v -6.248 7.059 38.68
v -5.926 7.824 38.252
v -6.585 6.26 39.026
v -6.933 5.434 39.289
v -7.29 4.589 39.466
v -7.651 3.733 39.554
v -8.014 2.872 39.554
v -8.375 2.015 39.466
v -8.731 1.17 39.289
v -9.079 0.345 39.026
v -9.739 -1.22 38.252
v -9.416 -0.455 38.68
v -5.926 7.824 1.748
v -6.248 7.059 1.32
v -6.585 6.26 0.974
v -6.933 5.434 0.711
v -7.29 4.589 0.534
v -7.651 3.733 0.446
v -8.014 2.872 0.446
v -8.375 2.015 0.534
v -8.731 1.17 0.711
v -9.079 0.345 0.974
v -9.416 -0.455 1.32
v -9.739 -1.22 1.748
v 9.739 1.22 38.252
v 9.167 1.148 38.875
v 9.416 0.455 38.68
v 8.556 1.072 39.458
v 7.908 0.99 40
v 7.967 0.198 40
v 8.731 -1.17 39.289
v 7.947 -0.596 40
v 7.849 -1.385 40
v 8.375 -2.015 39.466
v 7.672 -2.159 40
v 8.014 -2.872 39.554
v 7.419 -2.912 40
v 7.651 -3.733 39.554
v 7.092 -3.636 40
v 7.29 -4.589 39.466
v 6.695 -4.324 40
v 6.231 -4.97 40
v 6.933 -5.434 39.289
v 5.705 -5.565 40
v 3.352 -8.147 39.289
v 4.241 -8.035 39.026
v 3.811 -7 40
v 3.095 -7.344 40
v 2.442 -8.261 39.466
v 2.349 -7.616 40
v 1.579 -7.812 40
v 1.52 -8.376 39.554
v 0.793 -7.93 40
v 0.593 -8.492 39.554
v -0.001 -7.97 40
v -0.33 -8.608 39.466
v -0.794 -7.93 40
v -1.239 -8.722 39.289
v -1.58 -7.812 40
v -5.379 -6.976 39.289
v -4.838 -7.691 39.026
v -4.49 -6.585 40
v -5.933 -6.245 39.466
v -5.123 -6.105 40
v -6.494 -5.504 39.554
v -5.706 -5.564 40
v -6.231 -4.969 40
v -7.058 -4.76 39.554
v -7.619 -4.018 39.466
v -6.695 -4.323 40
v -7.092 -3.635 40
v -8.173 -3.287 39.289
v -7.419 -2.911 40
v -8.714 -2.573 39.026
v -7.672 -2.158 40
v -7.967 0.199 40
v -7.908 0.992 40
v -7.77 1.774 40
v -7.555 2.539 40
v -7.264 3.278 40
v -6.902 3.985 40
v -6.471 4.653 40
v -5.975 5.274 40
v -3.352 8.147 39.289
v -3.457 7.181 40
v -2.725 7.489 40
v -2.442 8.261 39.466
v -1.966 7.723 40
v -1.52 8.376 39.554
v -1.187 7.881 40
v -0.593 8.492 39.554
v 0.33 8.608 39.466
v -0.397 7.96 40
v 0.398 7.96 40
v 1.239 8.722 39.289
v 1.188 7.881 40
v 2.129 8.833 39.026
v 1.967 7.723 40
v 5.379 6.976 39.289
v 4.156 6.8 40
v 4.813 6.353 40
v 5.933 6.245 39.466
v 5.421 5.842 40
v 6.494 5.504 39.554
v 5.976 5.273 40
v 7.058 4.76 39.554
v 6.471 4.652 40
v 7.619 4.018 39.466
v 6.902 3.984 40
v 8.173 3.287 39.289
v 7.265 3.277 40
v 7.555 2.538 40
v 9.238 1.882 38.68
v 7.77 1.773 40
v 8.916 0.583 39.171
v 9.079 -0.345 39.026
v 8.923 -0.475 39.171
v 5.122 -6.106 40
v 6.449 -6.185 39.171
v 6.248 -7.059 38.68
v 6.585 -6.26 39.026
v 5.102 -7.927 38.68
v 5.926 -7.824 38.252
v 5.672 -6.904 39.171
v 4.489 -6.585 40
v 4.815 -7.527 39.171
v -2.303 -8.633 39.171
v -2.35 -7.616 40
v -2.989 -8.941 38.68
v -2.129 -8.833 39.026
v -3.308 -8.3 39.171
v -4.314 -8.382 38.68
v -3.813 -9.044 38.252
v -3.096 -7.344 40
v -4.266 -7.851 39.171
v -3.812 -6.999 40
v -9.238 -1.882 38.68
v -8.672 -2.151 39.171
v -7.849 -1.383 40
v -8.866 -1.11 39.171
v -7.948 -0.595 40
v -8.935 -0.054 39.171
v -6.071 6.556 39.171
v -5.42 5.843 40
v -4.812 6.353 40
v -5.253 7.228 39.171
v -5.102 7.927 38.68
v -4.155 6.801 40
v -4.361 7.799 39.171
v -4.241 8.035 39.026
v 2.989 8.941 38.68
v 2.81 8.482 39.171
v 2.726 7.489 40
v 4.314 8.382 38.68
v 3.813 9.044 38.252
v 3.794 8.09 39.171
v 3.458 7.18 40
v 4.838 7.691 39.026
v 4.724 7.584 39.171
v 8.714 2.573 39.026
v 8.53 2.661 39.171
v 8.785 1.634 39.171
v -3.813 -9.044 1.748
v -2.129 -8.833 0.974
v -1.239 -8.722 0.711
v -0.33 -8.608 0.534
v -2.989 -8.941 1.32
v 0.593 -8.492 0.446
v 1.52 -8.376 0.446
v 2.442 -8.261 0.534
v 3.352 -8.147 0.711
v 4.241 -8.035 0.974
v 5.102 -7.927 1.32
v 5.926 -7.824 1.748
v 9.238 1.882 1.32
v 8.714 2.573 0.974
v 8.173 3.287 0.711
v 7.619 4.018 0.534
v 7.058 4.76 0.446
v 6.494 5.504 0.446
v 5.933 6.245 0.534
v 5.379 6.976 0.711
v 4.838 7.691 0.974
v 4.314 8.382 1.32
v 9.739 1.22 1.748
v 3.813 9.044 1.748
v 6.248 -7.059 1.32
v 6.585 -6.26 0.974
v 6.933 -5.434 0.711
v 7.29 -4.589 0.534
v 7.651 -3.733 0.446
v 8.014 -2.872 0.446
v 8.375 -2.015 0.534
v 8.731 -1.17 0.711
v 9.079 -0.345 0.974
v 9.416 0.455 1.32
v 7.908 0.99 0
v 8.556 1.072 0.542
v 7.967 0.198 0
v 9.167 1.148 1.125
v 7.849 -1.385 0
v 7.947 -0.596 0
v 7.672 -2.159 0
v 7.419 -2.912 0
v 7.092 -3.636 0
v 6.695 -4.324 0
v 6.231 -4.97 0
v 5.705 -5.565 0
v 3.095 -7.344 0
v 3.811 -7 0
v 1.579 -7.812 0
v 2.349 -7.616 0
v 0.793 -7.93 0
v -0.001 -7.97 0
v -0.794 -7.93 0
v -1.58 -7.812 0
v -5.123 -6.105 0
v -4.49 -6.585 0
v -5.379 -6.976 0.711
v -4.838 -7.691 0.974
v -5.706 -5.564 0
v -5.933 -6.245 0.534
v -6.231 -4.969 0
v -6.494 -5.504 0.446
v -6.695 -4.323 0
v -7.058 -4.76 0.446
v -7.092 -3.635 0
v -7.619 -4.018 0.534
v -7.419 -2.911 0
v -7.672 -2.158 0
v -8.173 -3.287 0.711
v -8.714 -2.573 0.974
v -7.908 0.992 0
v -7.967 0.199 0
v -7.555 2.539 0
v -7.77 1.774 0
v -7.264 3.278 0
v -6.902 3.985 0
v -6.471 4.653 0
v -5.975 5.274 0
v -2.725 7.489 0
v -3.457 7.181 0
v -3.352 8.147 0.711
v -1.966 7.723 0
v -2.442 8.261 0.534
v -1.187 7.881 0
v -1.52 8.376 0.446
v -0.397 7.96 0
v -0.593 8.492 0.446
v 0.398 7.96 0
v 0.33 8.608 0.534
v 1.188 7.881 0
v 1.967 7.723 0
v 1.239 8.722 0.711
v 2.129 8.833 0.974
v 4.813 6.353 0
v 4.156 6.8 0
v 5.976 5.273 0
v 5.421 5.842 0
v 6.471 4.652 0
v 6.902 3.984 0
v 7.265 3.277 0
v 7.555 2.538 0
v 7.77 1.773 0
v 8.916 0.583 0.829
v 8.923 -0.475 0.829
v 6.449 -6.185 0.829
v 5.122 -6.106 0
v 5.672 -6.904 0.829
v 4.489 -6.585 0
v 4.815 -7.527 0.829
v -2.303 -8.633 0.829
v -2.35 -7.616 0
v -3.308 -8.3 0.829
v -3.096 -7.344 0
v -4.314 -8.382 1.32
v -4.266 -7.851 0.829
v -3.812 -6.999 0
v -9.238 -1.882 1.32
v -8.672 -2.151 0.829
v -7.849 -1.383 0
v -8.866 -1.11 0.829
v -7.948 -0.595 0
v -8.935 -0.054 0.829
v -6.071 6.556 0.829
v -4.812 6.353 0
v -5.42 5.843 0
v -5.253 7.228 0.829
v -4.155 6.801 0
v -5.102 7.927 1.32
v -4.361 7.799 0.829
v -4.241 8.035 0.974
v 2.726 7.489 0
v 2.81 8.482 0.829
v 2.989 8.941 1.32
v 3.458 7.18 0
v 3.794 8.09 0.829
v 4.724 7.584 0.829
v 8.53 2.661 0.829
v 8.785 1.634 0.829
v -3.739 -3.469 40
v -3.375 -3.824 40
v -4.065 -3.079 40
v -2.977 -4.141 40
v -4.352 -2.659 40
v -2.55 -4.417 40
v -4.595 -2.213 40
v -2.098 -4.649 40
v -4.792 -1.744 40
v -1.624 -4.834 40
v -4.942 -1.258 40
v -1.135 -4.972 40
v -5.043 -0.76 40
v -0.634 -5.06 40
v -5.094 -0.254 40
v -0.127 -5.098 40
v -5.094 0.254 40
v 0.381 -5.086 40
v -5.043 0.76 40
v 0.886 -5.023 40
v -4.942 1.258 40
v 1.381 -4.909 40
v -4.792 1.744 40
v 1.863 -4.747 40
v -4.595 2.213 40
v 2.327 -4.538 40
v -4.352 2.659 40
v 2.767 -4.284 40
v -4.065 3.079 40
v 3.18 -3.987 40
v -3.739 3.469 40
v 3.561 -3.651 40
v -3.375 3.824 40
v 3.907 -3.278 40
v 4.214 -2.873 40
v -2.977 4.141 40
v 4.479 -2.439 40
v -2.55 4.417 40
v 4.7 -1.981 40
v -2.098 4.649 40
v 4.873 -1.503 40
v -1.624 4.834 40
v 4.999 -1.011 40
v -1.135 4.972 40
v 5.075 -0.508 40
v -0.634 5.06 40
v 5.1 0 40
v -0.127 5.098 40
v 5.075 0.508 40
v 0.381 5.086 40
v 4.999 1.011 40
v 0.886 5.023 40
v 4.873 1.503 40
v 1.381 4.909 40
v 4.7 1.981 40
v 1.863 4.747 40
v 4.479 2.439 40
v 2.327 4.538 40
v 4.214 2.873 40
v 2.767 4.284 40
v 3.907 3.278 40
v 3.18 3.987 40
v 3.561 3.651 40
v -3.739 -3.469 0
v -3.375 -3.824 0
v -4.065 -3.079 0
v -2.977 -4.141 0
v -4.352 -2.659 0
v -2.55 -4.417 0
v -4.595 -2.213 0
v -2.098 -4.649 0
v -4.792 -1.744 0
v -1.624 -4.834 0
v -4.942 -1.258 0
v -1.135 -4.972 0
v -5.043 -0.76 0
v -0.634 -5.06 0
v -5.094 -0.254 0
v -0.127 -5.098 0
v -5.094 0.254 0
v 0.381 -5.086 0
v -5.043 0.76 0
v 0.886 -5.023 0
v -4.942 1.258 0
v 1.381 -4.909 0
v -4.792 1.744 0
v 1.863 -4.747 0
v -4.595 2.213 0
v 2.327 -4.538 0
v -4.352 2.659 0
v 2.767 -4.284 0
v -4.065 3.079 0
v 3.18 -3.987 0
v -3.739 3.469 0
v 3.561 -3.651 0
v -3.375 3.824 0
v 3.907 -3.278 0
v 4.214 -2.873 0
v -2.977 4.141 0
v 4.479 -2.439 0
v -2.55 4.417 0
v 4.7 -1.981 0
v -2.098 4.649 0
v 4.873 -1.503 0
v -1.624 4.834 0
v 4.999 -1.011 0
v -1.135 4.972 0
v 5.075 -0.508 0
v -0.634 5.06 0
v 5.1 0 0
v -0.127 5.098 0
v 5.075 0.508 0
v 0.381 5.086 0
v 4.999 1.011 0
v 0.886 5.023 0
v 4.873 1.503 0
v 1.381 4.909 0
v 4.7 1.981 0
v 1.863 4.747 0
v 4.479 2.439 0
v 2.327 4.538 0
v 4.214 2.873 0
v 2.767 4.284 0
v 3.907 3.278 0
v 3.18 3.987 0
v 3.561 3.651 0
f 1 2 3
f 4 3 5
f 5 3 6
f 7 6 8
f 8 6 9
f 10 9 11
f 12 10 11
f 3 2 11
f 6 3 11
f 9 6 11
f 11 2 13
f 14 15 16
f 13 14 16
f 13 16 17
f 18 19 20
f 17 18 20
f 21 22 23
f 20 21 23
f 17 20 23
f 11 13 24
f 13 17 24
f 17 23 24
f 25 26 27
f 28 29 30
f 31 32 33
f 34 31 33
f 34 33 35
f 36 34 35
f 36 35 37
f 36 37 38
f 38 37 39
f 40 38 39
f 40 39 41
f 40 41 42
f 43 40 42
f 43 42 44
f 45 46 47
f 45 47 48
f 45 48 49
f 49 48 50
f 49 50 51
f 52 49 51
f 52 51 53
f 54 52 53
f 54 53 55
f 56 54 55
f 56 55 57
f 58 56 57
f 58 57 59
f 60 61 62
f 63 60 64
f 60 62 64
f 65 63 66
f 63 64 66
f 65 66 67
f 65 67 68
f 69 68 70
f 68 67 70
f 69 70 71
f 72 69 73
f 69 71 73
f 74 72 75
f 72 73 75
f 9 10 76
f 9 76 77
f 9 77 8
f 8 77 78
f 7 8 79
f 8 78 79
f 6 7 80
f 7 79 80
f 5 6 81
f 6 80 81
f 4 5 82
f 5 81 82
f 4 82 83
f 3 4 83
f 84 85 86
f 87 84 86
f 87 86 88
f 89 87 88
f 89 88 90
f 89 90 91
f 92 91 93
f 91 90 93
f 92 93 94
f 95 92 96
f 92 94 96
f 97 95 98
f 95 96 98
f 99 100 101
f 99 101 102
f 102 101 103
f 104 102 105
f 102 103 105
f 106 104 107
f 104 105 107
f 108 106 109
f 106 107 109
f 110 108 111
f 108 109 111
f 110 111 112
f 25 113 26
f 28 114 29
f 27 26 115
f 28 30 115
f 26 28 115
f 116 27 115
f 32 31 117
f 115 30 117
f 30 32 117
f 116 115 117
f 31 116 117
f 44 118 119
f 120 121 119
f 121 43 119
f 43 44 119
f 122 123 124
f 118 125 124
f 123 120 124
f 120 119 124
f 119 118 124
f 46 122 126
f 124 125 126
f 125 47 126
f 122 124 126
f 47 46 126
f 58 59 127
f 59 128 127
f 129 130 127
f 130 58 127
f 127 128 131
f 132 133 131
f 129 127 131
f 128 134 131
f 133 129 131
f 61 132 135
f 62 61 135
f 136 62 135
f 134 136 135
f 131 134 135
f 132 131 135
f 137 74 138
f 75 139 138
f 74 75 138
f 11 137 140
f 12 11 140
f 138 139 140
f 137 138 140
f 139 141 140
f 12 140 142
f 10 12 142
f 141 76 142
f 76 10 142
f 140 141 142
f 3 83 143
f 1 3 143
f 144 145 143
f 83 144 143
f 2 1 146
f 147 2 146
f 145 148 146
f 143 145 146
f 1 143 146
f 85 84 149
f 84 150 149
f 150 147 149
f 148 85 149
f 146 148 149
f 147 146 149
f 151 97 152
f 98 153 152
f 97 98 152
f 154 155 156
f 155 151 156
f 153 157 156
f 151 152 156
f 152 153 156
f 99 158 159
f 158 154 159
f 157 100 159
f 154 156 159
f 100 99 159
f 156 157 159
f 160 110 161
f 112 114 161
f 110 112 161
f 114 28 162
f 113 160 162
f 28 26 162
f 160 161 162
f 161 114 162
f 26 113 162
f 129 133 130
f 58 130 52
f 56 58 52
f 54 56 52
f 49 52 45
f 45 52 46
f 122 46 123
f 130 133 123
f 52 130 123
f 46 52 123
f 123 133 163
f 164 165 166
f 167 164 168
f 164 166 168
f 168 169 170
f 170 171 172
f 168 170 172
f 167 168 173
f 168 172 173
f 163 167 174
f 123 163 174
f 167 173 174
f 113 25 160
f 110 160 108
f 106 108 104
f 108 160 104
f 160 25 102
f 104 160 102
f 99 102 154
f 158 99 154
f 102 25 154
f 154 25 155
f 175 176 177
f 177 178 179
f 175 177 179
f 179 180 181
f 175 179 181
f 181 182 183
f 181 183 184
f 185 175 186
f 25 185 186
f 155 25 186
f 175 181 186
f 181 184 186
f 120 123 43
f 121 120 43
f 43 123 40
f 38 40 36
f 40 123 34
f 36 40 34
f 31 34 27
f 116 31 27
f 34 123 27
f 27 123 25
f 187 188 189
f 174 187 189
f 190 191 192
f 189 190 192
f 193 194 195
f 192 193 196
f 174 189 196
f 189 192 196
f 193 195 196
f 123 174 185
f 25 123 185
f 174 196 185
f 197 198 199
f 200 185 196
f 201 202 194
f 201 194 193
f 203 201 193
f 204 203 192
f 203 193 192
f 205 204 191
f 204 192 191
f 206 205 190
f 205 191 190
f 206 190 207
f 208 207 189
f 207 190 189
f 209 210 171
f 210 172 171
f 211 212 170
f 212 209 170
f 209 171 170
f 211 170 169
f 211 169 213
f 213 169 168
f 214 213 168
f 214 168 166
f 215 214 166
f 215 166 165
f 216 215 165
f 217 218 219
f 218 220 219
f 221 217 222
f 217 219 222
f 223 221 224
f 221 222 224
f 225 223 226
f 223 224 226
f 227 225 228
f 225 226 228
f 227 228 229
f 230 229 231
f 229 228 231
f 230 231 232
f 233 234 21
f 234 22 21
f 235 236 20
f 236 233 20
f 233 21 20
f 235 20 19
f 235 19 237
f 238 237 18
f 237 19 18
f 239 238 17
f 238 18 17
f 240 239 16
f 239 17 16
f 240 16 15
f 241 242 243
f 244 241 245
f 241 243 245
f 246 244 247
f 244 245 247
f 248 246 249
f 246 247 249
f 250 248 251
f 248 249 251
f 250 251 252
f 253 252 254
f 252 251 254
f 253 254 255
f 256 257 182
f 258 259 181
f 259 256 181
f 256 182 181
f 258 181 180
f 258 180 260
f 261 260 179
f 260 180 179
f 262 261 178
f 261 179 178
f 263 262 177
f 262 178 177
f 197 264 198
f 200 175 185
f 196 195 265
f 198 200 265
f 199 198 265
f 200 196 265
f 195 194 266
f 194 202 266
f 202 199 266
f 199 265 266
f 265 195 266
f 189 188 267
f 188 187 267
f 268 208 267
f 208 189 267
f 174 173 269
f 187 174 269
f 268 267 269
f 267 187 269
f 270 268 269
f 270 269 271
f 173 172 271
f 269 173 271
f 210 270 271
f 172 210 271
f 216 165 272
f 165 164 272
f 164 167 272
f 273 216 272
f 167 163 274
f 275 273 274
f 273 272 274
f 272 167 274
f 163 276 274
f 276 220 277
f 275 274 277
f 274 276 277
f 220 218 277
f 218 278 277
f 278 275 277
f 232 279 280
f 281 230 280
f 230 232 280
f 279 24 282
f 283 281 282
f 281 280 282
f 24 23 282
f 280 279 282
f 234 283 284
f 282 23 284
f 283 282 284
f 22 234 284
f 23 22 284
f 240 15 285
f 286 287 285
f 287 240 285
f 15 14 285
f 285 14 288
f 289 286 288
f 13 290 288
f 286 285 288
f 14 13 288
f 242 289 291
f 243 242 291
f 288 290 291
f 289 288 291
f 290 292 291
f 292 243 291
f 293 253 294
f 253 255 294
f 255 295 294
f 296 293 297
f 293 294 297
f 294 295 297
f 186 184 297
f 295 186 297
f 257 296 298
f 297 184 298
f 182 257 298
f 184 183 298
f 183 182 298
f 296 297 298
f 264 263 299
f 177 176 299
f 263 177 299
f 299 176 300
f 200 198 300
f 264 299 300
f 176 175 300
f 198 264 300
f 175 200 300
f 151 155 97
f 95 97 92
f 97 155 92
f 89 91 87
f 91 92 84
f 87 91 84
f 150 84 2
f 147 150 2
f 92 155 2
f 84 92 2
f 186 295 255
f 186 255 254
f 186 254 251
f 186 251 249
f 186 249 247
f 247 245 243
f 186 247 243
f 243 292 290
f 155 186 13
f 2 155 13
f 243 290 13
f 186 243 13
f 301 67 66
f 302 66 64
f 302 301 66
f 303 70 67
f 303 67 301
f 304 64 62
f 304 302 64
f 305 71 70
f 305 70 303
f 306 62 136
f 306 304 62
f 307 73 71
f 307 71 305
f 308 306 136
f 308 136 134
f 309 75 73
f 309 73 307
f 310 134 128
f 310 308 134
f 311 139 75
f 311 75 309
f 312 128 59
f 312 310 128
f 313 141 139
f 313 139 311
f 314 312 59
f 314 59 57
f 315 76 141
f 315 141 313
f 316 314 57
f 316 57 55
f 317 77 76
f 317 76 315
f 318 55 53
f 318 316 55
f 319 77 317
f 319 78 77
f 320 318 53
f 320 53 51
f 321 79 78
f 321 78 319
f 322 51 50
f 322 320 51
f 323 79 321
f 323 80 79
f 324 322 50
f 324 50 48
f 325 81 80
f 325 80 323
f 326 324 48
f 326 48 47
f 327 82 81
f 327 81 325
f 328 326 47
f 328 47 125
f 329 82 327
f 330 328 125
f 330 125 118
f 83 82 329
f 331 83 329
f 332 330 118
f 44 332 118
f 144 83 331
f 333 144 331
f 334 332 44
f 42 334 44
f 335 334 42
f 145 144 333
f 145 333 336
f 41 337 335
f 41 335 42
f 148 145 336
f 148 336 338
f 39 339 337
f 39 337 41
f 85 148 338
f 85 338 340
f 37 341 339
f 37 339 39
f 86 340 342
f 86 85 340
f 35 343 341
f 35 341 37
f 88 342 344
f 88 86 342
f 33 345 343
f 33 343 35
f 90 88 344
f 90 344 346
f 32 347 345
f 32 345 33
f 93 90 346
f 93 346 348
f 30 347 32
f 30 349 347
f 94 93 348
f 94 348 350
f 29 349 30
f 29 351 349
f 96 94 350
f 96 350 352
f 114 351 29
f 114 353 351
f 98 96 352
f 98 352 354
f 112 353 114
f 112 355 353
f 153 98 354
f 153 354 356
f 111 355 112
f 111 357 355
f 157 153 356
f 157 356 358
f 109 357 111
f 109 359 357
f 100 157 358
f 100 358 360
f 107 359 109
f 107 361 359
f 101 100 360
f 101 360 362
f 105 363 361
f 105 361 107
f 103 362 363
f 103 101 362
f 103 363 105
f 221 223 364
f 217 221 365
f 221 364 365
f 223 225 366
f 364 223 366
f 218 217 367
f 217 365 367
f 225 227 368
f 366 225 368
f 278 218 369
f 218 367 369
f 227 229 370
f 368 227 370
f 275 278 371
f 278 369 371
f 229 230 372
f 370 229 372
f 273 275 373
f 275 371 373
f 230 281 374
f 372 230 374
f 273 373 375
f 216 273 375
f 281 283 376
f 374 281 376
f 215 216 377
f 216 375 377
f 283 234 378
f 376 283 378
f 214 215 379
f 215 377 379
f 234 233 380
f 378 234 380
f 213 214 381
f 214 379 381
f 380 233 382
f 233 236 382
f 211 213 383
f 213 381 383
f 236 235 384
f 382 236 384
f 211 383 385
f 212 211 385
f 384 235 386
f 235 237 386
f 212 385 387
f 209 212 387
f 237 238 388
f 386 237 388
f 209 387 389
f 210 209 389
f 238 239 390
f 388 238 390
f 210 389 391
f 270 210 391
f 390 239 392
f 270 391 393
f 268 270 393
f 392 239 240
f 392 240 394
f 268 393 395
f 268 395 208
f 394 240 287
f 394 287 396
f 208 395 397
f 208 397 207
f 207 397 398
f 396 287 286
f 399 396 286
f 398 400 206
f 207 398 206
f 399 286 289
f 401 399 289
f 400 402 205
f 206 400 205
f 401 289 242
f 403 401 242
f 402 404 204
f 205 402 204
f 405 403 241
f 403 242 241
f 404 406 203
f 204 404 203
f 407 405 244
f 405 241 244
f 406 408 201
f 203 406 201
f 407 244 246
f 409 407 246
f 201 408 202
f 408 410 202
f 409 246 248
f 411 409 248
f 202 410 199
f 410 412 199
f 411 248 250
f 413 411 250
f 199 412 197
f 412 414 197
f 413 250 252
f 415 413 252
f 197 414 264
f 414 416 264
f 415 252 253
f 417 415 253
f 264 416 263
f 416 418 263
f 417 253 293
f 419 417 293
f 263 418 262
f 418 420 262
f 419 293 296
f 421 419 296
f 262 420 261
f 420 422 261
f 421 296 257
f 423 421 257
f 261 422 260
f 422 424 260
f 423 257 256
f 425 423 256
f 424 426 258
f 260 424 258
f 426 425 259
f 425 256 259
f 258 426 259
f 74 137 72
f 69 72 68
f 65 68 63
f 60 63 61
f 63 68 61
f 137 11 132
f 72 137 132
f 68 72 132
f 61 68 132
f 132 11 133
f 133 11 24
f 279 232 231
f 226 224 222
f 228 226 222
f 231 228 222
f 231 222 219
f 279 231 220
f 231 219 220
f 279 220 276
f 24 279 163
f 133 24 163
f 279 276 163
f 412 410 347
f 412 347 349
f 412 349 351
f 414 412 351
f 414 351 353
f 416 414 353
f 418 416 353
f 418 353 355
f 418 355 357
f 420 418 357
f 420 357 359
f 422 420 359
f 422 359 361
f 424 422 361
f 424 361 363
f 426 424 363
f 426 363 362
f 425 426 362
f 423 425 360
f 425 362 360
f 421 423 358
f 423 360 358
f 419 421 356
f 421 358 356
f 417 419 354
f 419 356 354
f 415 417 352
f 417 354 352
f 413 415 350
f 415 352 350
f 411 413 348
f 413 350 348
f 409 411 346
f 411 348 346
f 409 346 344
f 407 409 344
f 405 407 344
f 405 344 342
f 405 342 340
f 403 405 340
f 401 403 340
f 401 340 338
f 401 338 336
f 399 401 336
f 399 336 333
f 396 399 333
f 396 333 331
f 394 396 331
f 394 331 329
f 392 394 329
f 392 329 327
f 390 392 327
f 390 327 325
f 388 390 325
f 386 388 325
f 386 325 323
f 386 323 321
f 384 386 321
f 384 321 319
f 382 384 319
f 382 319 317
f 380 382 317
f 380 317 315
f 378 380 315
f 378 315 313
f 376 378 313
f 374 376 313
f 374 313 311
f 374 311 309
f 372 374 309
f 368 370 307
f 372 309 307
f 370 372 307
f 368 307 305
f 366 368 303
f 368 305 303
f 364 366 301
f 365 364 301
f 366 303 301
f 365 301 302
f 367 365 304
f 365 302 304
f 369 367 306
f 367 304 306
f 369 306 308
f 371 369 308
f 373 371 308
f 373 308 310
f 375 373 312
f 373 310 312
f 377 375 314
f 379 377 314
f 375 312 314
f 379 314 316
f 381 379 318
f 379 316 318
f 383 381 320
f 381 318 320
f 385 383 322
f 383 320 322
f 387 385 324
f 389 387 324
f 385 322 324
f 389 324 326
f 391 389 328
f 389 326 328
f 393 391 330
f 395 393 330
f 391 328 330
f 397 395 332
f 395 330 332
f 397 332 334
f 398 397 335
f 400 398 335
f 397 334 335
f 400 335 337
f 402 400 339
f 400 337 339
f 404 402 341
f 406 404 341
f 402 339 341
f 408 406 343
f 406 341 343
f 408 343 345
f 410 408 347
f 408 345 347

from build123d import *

# Parameters (mm, degrees)
EXTRUSION1_DEPTH   = 40
TROU_TARAUD_M121_D = 10.2


with BuildPart() as part:
    # Esquisse1 → Extrusion1 (new body)
    with BuildSketch(Plane.XY):
        Polygon((3.813132395, 9.043967861), (-5.925739721, 7.824253453), (-9.738872116, -1.219714408), (-3.813132395, -9.043967861), (5.925739721, -7.824253453), (9.738872116, 1.219714408), align=None)
    extrude(amount=EXTRUSION1_DEPTH)

    # Trou taraudé M121 (through all)
    with Locations(Plane(origin=(0, 0, 0), x_dir=(-1, 0, 0), z_dir=(0, 0, -1))):
        with Locations((0, 0)):
            Hole(TROU_TARAUD_M121_D / 2)

    # Esquisse5 → Enlèvement de matière-Révolution1 (revolve, cut)
    with BuildSketch(Plane(origin=(0, 0, 0), x_dir=(1, 0, 0), z_dir=(0, 1, 0)), mode=Mode.PRIVATE) as enl_vement_de_mati_re_r_volution1_sk:
        with BuildLine():
            Line((0, 7.38932546), (0, 2.731180457))
            ThreePointArc((0, 2.731180457), (9.188017929, -1.07462118), (12.993819567, -10.26263911))
            Line((12.993819567, -10.26263911), (12.993819567, 7.38932546))
            Line((12.993819567, 7.38932546), (0, 7.38932546))
        make_face()
        with BuildLine():
            Line((12.993819567, -47.38932546), (12.993819567, -29.73736089))
            ThreePointArc((12.993819567, -29.73736089), (9.188017929, -38.92537882), (0, -42.731180457))
            Line((0, -42.731180457), (0, -47.38932546))
            Line((0, -47.38932546), (12.993819567, -47.38932546))
        make_face()
    revolve(enl_vement_de_mati_re_r_volution1_sk.sketch.rotate(Axis((0, 0, 10.26263911), (0, 0, -1)), 352.861339984), axis=Axis((0, 0, 10.26263911), (0, 0, -1)), mode=Mode.SUBTRACT)


solid = part.part
